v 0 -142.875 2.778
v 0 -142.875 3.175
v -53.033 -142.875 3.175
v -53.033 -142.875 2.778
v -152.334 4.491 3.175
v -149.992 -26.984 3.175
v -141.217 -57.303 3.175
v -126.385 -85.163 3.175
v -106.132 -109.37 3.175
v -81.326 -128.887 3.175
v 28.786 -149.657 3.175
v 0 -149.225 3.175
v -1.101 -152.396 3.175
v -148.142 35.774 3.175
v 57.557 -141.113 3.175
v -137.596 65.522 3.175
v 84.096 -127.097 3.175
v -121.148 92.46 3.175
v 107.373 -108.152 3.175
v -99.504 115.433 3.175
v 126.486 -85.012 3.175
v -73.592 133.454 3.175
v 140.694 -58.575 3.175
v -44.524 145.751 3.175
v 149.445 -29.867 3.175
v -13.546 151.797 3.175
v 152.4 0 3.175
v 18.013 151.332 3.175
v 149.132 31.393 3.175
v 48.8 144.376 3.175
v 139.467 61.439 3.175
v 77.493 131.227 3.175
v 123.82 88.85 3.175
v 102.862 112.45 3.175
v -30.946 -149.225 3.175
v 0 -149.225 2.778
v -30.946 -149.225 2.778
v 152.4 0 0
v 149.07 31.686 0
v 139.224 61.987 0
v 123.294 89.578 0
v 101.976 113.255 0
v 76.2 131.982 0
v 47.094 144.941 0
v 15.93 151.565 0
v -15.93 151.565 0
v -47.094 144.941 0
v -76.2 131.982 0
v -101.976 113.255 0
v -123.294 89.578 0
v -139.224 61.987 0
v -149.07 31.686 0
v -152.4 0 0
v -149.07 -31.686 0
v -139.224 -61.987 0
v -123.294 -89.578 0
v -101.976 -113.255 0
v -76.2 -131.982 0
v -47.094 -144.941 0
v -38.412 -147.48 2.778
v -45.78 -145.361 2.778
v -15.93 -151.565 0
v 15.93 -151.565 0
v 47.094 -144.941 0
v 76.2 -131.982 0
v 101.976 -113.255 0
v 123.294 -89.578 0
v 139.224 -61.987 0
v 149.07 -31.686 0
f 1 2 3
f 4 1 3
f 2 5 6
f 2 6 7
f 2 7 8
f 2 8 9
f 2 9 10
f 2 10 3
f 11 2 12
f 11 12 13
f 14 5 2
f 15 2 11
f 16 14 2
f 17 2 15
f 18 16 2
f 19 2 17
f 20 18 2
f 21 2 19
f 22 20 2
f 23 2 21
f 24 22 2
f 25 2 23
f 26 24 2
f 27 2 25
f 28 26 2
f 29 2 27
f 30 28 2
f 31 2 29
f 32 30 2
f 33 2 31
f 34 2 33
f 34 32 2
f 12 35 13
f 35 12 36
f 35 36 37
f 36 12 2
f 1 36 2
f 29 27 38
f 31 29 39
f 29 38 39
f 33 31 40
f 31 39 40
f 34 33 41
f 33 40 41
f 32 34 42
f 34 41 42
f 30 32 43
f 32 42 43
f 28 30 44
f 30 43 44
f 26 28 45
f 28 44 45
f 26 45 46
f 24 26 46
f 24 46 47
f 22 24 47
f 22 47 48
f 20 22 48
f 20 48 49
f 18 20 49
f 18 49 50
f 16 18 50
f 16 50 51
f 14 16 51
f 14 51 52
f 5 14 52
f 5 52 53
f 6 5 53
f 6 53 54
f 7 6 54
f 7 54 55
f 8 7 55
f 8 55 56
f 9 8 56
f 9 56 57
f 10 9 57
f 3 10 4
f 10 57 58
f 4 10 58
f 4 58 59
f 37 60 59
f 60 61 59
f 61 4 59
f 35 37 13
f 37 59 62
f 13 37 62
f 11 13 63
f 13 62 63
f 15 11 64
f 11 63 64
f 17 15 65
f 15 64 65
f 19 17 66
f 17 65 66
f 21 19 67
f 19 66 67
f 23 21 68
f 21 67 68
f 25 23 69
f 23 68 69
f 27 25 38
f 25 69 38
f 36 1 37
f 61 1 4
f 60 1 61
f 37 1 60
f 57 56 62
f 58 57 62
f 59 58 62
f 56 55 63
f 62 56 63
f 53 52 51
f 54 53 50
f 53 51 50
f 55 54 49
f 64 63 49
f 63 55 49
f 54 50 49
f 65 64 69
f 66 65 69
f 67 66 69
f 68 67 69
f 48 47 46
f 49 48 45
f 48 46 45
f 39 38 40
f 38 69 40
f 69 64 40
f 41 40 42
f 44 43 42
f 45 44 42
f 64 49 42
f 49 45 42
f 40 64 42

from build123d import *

# Parameters (mm, degrees)
SKETCH1_R           = 152.4
BOSS_EXTRUDE1_DEPTH = 3.175
CUT_EXTRUDE2_START  = -3.175
SKETCH2_W           = 117.669510625
SKETCH2_H           = 6.35
CUT_EXTRUDE2_DEPTH  = 0.396875


with BuildPart() as part:
    # Sketch1 → Boss-Extrude1 (new body)
    with BuildSketch(Plane.XY):
        Circle(SKETCH1_R)
    extrude(amount=BOSS_EXTRUDE1_DEPTH)

    # Sketch2 → Cut-Extrude2 (cut)
    with BuildSketch(Plane(origin=(0, 0, 0), x_dir=(-1, 0, 0), z_dir=(0, 0, -1)).offset(CUT_EXTRUDE2_START)):
        with Locations((58.834755313, -146.05)):
            Rectangle(SKETCH2_W, SKETCH2_H)
    extrude(amount=CUT_EXTRUDE2_DEPTH, mode=Mode.SUBTRACT)


solid = part.part
